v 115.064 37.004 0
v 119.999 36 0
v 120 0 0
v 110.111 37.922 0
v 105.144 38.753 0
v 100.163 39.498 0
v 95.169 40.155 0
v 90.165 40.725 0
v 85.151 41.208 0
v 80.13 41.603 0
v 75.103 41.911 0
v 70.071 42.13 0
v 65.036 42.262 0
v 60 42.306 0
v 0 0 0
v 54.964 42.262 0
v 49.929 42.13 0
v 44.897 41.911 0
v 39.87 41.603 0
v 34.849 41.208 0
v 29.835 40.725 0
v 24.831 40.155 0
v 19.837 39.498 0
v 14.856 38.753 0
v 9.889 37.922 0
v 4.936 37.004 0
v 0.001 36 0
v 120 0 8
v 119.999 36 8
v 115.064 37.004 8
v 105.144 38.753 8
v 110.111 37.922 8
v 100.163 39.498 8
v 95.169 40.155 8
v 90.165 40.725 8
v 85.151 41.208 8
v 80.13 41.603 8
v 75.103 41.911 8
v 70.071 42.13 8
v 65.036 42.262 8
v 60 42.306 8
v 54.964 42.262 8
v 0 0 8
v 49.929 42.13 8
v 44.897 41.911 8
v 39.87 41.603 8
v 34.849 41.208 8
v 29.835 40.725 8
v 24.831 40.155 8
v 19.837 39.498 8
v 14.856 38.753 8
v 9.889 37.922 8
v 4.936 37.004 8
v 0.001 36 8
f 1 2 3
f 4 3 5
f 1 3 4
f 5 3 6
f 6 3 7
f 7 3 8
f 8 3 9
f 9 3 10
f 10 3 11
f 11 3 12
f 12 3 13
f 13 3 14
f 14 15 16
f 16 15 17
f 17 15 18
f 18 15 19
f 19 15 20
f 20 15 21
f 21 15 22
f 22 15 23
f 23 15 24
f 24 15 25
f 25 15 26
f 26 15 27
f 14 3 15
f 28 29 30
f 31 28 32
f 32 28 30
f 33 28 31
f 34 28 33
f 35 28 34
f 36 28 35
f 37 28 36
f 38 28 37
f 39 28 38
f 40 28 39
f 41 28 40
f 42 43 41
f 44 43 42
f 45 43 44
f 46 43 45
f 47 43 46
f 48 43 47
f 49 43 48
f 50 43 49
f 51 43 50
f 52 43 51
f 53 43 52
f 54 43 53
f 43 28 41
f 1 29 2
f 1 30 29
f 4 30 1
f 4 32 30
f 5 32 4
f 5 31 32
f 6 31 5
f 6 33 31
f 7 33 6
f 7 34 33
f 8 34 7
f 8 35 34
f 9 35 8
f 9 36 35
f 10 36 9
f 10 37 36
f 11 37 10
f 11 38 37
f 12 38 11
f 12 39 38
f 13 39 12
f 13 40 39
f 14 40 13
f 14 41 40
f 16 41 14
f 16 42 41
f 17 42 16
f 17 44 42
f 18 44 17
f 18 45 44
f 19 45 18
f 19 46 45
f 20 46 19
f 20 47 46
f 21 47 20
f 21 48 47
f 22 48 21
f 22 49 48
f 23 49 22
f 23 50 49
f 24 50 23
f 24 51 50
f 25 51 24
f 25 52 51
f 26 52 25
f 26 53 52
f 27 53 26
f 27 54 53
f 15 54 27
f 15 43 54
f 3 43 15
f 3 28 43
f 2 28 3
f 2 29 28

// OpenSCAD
$fn = 32;

// ----------------------------------------------------------------------
// Arc profile plate: crown, 27 points
// ----------------------------------------------------------------------

// --- parameters (mm) ---
bar_l = 120;              // bar length, X
bar_w = 36;               // bar height at the ends, Y
arc_r = 288.58;           // radius of the crown arc
arc_angle = 24;           // crown arc angle, degrees
crown_rise = 6.31;        // rise of the crown over the ends
arc_step = 1;             // sampling step of the crown arc, degrees
plate_t = 8;              // plate thickness, Z

bbox_y = bar_w + crown_rise;  // full height with the crown

profile = [[119.999, 36], [115.064, 37.004], [110.111, 37.922], [105.144, 38.753], [100.163, 39.498], [95.169, 40.155], [90.165, 40.725], [85.151, 41.208], [80.13, 41.603], [75.103, 41.911], [70.071, 42.13], [65.036, 42.262], [60, 42.306], [54.964, 42.262], [49.929, 42.13], [44.897, 41.911], [39.87, 41.603], [34.849, 41.208], [29.835, 40.725], [24.831, 40.155], [19.837, 39.498], [14.856, 38.753], [9.889, 37.922], [4.936, 37.004], [0.001, 36], [0, 0], [120, 0]];  // primary outline, 27 points, counter clockwise

// --- the one profile operation ---
linear_extrude(height = plate_t) polygon(points = profile);
